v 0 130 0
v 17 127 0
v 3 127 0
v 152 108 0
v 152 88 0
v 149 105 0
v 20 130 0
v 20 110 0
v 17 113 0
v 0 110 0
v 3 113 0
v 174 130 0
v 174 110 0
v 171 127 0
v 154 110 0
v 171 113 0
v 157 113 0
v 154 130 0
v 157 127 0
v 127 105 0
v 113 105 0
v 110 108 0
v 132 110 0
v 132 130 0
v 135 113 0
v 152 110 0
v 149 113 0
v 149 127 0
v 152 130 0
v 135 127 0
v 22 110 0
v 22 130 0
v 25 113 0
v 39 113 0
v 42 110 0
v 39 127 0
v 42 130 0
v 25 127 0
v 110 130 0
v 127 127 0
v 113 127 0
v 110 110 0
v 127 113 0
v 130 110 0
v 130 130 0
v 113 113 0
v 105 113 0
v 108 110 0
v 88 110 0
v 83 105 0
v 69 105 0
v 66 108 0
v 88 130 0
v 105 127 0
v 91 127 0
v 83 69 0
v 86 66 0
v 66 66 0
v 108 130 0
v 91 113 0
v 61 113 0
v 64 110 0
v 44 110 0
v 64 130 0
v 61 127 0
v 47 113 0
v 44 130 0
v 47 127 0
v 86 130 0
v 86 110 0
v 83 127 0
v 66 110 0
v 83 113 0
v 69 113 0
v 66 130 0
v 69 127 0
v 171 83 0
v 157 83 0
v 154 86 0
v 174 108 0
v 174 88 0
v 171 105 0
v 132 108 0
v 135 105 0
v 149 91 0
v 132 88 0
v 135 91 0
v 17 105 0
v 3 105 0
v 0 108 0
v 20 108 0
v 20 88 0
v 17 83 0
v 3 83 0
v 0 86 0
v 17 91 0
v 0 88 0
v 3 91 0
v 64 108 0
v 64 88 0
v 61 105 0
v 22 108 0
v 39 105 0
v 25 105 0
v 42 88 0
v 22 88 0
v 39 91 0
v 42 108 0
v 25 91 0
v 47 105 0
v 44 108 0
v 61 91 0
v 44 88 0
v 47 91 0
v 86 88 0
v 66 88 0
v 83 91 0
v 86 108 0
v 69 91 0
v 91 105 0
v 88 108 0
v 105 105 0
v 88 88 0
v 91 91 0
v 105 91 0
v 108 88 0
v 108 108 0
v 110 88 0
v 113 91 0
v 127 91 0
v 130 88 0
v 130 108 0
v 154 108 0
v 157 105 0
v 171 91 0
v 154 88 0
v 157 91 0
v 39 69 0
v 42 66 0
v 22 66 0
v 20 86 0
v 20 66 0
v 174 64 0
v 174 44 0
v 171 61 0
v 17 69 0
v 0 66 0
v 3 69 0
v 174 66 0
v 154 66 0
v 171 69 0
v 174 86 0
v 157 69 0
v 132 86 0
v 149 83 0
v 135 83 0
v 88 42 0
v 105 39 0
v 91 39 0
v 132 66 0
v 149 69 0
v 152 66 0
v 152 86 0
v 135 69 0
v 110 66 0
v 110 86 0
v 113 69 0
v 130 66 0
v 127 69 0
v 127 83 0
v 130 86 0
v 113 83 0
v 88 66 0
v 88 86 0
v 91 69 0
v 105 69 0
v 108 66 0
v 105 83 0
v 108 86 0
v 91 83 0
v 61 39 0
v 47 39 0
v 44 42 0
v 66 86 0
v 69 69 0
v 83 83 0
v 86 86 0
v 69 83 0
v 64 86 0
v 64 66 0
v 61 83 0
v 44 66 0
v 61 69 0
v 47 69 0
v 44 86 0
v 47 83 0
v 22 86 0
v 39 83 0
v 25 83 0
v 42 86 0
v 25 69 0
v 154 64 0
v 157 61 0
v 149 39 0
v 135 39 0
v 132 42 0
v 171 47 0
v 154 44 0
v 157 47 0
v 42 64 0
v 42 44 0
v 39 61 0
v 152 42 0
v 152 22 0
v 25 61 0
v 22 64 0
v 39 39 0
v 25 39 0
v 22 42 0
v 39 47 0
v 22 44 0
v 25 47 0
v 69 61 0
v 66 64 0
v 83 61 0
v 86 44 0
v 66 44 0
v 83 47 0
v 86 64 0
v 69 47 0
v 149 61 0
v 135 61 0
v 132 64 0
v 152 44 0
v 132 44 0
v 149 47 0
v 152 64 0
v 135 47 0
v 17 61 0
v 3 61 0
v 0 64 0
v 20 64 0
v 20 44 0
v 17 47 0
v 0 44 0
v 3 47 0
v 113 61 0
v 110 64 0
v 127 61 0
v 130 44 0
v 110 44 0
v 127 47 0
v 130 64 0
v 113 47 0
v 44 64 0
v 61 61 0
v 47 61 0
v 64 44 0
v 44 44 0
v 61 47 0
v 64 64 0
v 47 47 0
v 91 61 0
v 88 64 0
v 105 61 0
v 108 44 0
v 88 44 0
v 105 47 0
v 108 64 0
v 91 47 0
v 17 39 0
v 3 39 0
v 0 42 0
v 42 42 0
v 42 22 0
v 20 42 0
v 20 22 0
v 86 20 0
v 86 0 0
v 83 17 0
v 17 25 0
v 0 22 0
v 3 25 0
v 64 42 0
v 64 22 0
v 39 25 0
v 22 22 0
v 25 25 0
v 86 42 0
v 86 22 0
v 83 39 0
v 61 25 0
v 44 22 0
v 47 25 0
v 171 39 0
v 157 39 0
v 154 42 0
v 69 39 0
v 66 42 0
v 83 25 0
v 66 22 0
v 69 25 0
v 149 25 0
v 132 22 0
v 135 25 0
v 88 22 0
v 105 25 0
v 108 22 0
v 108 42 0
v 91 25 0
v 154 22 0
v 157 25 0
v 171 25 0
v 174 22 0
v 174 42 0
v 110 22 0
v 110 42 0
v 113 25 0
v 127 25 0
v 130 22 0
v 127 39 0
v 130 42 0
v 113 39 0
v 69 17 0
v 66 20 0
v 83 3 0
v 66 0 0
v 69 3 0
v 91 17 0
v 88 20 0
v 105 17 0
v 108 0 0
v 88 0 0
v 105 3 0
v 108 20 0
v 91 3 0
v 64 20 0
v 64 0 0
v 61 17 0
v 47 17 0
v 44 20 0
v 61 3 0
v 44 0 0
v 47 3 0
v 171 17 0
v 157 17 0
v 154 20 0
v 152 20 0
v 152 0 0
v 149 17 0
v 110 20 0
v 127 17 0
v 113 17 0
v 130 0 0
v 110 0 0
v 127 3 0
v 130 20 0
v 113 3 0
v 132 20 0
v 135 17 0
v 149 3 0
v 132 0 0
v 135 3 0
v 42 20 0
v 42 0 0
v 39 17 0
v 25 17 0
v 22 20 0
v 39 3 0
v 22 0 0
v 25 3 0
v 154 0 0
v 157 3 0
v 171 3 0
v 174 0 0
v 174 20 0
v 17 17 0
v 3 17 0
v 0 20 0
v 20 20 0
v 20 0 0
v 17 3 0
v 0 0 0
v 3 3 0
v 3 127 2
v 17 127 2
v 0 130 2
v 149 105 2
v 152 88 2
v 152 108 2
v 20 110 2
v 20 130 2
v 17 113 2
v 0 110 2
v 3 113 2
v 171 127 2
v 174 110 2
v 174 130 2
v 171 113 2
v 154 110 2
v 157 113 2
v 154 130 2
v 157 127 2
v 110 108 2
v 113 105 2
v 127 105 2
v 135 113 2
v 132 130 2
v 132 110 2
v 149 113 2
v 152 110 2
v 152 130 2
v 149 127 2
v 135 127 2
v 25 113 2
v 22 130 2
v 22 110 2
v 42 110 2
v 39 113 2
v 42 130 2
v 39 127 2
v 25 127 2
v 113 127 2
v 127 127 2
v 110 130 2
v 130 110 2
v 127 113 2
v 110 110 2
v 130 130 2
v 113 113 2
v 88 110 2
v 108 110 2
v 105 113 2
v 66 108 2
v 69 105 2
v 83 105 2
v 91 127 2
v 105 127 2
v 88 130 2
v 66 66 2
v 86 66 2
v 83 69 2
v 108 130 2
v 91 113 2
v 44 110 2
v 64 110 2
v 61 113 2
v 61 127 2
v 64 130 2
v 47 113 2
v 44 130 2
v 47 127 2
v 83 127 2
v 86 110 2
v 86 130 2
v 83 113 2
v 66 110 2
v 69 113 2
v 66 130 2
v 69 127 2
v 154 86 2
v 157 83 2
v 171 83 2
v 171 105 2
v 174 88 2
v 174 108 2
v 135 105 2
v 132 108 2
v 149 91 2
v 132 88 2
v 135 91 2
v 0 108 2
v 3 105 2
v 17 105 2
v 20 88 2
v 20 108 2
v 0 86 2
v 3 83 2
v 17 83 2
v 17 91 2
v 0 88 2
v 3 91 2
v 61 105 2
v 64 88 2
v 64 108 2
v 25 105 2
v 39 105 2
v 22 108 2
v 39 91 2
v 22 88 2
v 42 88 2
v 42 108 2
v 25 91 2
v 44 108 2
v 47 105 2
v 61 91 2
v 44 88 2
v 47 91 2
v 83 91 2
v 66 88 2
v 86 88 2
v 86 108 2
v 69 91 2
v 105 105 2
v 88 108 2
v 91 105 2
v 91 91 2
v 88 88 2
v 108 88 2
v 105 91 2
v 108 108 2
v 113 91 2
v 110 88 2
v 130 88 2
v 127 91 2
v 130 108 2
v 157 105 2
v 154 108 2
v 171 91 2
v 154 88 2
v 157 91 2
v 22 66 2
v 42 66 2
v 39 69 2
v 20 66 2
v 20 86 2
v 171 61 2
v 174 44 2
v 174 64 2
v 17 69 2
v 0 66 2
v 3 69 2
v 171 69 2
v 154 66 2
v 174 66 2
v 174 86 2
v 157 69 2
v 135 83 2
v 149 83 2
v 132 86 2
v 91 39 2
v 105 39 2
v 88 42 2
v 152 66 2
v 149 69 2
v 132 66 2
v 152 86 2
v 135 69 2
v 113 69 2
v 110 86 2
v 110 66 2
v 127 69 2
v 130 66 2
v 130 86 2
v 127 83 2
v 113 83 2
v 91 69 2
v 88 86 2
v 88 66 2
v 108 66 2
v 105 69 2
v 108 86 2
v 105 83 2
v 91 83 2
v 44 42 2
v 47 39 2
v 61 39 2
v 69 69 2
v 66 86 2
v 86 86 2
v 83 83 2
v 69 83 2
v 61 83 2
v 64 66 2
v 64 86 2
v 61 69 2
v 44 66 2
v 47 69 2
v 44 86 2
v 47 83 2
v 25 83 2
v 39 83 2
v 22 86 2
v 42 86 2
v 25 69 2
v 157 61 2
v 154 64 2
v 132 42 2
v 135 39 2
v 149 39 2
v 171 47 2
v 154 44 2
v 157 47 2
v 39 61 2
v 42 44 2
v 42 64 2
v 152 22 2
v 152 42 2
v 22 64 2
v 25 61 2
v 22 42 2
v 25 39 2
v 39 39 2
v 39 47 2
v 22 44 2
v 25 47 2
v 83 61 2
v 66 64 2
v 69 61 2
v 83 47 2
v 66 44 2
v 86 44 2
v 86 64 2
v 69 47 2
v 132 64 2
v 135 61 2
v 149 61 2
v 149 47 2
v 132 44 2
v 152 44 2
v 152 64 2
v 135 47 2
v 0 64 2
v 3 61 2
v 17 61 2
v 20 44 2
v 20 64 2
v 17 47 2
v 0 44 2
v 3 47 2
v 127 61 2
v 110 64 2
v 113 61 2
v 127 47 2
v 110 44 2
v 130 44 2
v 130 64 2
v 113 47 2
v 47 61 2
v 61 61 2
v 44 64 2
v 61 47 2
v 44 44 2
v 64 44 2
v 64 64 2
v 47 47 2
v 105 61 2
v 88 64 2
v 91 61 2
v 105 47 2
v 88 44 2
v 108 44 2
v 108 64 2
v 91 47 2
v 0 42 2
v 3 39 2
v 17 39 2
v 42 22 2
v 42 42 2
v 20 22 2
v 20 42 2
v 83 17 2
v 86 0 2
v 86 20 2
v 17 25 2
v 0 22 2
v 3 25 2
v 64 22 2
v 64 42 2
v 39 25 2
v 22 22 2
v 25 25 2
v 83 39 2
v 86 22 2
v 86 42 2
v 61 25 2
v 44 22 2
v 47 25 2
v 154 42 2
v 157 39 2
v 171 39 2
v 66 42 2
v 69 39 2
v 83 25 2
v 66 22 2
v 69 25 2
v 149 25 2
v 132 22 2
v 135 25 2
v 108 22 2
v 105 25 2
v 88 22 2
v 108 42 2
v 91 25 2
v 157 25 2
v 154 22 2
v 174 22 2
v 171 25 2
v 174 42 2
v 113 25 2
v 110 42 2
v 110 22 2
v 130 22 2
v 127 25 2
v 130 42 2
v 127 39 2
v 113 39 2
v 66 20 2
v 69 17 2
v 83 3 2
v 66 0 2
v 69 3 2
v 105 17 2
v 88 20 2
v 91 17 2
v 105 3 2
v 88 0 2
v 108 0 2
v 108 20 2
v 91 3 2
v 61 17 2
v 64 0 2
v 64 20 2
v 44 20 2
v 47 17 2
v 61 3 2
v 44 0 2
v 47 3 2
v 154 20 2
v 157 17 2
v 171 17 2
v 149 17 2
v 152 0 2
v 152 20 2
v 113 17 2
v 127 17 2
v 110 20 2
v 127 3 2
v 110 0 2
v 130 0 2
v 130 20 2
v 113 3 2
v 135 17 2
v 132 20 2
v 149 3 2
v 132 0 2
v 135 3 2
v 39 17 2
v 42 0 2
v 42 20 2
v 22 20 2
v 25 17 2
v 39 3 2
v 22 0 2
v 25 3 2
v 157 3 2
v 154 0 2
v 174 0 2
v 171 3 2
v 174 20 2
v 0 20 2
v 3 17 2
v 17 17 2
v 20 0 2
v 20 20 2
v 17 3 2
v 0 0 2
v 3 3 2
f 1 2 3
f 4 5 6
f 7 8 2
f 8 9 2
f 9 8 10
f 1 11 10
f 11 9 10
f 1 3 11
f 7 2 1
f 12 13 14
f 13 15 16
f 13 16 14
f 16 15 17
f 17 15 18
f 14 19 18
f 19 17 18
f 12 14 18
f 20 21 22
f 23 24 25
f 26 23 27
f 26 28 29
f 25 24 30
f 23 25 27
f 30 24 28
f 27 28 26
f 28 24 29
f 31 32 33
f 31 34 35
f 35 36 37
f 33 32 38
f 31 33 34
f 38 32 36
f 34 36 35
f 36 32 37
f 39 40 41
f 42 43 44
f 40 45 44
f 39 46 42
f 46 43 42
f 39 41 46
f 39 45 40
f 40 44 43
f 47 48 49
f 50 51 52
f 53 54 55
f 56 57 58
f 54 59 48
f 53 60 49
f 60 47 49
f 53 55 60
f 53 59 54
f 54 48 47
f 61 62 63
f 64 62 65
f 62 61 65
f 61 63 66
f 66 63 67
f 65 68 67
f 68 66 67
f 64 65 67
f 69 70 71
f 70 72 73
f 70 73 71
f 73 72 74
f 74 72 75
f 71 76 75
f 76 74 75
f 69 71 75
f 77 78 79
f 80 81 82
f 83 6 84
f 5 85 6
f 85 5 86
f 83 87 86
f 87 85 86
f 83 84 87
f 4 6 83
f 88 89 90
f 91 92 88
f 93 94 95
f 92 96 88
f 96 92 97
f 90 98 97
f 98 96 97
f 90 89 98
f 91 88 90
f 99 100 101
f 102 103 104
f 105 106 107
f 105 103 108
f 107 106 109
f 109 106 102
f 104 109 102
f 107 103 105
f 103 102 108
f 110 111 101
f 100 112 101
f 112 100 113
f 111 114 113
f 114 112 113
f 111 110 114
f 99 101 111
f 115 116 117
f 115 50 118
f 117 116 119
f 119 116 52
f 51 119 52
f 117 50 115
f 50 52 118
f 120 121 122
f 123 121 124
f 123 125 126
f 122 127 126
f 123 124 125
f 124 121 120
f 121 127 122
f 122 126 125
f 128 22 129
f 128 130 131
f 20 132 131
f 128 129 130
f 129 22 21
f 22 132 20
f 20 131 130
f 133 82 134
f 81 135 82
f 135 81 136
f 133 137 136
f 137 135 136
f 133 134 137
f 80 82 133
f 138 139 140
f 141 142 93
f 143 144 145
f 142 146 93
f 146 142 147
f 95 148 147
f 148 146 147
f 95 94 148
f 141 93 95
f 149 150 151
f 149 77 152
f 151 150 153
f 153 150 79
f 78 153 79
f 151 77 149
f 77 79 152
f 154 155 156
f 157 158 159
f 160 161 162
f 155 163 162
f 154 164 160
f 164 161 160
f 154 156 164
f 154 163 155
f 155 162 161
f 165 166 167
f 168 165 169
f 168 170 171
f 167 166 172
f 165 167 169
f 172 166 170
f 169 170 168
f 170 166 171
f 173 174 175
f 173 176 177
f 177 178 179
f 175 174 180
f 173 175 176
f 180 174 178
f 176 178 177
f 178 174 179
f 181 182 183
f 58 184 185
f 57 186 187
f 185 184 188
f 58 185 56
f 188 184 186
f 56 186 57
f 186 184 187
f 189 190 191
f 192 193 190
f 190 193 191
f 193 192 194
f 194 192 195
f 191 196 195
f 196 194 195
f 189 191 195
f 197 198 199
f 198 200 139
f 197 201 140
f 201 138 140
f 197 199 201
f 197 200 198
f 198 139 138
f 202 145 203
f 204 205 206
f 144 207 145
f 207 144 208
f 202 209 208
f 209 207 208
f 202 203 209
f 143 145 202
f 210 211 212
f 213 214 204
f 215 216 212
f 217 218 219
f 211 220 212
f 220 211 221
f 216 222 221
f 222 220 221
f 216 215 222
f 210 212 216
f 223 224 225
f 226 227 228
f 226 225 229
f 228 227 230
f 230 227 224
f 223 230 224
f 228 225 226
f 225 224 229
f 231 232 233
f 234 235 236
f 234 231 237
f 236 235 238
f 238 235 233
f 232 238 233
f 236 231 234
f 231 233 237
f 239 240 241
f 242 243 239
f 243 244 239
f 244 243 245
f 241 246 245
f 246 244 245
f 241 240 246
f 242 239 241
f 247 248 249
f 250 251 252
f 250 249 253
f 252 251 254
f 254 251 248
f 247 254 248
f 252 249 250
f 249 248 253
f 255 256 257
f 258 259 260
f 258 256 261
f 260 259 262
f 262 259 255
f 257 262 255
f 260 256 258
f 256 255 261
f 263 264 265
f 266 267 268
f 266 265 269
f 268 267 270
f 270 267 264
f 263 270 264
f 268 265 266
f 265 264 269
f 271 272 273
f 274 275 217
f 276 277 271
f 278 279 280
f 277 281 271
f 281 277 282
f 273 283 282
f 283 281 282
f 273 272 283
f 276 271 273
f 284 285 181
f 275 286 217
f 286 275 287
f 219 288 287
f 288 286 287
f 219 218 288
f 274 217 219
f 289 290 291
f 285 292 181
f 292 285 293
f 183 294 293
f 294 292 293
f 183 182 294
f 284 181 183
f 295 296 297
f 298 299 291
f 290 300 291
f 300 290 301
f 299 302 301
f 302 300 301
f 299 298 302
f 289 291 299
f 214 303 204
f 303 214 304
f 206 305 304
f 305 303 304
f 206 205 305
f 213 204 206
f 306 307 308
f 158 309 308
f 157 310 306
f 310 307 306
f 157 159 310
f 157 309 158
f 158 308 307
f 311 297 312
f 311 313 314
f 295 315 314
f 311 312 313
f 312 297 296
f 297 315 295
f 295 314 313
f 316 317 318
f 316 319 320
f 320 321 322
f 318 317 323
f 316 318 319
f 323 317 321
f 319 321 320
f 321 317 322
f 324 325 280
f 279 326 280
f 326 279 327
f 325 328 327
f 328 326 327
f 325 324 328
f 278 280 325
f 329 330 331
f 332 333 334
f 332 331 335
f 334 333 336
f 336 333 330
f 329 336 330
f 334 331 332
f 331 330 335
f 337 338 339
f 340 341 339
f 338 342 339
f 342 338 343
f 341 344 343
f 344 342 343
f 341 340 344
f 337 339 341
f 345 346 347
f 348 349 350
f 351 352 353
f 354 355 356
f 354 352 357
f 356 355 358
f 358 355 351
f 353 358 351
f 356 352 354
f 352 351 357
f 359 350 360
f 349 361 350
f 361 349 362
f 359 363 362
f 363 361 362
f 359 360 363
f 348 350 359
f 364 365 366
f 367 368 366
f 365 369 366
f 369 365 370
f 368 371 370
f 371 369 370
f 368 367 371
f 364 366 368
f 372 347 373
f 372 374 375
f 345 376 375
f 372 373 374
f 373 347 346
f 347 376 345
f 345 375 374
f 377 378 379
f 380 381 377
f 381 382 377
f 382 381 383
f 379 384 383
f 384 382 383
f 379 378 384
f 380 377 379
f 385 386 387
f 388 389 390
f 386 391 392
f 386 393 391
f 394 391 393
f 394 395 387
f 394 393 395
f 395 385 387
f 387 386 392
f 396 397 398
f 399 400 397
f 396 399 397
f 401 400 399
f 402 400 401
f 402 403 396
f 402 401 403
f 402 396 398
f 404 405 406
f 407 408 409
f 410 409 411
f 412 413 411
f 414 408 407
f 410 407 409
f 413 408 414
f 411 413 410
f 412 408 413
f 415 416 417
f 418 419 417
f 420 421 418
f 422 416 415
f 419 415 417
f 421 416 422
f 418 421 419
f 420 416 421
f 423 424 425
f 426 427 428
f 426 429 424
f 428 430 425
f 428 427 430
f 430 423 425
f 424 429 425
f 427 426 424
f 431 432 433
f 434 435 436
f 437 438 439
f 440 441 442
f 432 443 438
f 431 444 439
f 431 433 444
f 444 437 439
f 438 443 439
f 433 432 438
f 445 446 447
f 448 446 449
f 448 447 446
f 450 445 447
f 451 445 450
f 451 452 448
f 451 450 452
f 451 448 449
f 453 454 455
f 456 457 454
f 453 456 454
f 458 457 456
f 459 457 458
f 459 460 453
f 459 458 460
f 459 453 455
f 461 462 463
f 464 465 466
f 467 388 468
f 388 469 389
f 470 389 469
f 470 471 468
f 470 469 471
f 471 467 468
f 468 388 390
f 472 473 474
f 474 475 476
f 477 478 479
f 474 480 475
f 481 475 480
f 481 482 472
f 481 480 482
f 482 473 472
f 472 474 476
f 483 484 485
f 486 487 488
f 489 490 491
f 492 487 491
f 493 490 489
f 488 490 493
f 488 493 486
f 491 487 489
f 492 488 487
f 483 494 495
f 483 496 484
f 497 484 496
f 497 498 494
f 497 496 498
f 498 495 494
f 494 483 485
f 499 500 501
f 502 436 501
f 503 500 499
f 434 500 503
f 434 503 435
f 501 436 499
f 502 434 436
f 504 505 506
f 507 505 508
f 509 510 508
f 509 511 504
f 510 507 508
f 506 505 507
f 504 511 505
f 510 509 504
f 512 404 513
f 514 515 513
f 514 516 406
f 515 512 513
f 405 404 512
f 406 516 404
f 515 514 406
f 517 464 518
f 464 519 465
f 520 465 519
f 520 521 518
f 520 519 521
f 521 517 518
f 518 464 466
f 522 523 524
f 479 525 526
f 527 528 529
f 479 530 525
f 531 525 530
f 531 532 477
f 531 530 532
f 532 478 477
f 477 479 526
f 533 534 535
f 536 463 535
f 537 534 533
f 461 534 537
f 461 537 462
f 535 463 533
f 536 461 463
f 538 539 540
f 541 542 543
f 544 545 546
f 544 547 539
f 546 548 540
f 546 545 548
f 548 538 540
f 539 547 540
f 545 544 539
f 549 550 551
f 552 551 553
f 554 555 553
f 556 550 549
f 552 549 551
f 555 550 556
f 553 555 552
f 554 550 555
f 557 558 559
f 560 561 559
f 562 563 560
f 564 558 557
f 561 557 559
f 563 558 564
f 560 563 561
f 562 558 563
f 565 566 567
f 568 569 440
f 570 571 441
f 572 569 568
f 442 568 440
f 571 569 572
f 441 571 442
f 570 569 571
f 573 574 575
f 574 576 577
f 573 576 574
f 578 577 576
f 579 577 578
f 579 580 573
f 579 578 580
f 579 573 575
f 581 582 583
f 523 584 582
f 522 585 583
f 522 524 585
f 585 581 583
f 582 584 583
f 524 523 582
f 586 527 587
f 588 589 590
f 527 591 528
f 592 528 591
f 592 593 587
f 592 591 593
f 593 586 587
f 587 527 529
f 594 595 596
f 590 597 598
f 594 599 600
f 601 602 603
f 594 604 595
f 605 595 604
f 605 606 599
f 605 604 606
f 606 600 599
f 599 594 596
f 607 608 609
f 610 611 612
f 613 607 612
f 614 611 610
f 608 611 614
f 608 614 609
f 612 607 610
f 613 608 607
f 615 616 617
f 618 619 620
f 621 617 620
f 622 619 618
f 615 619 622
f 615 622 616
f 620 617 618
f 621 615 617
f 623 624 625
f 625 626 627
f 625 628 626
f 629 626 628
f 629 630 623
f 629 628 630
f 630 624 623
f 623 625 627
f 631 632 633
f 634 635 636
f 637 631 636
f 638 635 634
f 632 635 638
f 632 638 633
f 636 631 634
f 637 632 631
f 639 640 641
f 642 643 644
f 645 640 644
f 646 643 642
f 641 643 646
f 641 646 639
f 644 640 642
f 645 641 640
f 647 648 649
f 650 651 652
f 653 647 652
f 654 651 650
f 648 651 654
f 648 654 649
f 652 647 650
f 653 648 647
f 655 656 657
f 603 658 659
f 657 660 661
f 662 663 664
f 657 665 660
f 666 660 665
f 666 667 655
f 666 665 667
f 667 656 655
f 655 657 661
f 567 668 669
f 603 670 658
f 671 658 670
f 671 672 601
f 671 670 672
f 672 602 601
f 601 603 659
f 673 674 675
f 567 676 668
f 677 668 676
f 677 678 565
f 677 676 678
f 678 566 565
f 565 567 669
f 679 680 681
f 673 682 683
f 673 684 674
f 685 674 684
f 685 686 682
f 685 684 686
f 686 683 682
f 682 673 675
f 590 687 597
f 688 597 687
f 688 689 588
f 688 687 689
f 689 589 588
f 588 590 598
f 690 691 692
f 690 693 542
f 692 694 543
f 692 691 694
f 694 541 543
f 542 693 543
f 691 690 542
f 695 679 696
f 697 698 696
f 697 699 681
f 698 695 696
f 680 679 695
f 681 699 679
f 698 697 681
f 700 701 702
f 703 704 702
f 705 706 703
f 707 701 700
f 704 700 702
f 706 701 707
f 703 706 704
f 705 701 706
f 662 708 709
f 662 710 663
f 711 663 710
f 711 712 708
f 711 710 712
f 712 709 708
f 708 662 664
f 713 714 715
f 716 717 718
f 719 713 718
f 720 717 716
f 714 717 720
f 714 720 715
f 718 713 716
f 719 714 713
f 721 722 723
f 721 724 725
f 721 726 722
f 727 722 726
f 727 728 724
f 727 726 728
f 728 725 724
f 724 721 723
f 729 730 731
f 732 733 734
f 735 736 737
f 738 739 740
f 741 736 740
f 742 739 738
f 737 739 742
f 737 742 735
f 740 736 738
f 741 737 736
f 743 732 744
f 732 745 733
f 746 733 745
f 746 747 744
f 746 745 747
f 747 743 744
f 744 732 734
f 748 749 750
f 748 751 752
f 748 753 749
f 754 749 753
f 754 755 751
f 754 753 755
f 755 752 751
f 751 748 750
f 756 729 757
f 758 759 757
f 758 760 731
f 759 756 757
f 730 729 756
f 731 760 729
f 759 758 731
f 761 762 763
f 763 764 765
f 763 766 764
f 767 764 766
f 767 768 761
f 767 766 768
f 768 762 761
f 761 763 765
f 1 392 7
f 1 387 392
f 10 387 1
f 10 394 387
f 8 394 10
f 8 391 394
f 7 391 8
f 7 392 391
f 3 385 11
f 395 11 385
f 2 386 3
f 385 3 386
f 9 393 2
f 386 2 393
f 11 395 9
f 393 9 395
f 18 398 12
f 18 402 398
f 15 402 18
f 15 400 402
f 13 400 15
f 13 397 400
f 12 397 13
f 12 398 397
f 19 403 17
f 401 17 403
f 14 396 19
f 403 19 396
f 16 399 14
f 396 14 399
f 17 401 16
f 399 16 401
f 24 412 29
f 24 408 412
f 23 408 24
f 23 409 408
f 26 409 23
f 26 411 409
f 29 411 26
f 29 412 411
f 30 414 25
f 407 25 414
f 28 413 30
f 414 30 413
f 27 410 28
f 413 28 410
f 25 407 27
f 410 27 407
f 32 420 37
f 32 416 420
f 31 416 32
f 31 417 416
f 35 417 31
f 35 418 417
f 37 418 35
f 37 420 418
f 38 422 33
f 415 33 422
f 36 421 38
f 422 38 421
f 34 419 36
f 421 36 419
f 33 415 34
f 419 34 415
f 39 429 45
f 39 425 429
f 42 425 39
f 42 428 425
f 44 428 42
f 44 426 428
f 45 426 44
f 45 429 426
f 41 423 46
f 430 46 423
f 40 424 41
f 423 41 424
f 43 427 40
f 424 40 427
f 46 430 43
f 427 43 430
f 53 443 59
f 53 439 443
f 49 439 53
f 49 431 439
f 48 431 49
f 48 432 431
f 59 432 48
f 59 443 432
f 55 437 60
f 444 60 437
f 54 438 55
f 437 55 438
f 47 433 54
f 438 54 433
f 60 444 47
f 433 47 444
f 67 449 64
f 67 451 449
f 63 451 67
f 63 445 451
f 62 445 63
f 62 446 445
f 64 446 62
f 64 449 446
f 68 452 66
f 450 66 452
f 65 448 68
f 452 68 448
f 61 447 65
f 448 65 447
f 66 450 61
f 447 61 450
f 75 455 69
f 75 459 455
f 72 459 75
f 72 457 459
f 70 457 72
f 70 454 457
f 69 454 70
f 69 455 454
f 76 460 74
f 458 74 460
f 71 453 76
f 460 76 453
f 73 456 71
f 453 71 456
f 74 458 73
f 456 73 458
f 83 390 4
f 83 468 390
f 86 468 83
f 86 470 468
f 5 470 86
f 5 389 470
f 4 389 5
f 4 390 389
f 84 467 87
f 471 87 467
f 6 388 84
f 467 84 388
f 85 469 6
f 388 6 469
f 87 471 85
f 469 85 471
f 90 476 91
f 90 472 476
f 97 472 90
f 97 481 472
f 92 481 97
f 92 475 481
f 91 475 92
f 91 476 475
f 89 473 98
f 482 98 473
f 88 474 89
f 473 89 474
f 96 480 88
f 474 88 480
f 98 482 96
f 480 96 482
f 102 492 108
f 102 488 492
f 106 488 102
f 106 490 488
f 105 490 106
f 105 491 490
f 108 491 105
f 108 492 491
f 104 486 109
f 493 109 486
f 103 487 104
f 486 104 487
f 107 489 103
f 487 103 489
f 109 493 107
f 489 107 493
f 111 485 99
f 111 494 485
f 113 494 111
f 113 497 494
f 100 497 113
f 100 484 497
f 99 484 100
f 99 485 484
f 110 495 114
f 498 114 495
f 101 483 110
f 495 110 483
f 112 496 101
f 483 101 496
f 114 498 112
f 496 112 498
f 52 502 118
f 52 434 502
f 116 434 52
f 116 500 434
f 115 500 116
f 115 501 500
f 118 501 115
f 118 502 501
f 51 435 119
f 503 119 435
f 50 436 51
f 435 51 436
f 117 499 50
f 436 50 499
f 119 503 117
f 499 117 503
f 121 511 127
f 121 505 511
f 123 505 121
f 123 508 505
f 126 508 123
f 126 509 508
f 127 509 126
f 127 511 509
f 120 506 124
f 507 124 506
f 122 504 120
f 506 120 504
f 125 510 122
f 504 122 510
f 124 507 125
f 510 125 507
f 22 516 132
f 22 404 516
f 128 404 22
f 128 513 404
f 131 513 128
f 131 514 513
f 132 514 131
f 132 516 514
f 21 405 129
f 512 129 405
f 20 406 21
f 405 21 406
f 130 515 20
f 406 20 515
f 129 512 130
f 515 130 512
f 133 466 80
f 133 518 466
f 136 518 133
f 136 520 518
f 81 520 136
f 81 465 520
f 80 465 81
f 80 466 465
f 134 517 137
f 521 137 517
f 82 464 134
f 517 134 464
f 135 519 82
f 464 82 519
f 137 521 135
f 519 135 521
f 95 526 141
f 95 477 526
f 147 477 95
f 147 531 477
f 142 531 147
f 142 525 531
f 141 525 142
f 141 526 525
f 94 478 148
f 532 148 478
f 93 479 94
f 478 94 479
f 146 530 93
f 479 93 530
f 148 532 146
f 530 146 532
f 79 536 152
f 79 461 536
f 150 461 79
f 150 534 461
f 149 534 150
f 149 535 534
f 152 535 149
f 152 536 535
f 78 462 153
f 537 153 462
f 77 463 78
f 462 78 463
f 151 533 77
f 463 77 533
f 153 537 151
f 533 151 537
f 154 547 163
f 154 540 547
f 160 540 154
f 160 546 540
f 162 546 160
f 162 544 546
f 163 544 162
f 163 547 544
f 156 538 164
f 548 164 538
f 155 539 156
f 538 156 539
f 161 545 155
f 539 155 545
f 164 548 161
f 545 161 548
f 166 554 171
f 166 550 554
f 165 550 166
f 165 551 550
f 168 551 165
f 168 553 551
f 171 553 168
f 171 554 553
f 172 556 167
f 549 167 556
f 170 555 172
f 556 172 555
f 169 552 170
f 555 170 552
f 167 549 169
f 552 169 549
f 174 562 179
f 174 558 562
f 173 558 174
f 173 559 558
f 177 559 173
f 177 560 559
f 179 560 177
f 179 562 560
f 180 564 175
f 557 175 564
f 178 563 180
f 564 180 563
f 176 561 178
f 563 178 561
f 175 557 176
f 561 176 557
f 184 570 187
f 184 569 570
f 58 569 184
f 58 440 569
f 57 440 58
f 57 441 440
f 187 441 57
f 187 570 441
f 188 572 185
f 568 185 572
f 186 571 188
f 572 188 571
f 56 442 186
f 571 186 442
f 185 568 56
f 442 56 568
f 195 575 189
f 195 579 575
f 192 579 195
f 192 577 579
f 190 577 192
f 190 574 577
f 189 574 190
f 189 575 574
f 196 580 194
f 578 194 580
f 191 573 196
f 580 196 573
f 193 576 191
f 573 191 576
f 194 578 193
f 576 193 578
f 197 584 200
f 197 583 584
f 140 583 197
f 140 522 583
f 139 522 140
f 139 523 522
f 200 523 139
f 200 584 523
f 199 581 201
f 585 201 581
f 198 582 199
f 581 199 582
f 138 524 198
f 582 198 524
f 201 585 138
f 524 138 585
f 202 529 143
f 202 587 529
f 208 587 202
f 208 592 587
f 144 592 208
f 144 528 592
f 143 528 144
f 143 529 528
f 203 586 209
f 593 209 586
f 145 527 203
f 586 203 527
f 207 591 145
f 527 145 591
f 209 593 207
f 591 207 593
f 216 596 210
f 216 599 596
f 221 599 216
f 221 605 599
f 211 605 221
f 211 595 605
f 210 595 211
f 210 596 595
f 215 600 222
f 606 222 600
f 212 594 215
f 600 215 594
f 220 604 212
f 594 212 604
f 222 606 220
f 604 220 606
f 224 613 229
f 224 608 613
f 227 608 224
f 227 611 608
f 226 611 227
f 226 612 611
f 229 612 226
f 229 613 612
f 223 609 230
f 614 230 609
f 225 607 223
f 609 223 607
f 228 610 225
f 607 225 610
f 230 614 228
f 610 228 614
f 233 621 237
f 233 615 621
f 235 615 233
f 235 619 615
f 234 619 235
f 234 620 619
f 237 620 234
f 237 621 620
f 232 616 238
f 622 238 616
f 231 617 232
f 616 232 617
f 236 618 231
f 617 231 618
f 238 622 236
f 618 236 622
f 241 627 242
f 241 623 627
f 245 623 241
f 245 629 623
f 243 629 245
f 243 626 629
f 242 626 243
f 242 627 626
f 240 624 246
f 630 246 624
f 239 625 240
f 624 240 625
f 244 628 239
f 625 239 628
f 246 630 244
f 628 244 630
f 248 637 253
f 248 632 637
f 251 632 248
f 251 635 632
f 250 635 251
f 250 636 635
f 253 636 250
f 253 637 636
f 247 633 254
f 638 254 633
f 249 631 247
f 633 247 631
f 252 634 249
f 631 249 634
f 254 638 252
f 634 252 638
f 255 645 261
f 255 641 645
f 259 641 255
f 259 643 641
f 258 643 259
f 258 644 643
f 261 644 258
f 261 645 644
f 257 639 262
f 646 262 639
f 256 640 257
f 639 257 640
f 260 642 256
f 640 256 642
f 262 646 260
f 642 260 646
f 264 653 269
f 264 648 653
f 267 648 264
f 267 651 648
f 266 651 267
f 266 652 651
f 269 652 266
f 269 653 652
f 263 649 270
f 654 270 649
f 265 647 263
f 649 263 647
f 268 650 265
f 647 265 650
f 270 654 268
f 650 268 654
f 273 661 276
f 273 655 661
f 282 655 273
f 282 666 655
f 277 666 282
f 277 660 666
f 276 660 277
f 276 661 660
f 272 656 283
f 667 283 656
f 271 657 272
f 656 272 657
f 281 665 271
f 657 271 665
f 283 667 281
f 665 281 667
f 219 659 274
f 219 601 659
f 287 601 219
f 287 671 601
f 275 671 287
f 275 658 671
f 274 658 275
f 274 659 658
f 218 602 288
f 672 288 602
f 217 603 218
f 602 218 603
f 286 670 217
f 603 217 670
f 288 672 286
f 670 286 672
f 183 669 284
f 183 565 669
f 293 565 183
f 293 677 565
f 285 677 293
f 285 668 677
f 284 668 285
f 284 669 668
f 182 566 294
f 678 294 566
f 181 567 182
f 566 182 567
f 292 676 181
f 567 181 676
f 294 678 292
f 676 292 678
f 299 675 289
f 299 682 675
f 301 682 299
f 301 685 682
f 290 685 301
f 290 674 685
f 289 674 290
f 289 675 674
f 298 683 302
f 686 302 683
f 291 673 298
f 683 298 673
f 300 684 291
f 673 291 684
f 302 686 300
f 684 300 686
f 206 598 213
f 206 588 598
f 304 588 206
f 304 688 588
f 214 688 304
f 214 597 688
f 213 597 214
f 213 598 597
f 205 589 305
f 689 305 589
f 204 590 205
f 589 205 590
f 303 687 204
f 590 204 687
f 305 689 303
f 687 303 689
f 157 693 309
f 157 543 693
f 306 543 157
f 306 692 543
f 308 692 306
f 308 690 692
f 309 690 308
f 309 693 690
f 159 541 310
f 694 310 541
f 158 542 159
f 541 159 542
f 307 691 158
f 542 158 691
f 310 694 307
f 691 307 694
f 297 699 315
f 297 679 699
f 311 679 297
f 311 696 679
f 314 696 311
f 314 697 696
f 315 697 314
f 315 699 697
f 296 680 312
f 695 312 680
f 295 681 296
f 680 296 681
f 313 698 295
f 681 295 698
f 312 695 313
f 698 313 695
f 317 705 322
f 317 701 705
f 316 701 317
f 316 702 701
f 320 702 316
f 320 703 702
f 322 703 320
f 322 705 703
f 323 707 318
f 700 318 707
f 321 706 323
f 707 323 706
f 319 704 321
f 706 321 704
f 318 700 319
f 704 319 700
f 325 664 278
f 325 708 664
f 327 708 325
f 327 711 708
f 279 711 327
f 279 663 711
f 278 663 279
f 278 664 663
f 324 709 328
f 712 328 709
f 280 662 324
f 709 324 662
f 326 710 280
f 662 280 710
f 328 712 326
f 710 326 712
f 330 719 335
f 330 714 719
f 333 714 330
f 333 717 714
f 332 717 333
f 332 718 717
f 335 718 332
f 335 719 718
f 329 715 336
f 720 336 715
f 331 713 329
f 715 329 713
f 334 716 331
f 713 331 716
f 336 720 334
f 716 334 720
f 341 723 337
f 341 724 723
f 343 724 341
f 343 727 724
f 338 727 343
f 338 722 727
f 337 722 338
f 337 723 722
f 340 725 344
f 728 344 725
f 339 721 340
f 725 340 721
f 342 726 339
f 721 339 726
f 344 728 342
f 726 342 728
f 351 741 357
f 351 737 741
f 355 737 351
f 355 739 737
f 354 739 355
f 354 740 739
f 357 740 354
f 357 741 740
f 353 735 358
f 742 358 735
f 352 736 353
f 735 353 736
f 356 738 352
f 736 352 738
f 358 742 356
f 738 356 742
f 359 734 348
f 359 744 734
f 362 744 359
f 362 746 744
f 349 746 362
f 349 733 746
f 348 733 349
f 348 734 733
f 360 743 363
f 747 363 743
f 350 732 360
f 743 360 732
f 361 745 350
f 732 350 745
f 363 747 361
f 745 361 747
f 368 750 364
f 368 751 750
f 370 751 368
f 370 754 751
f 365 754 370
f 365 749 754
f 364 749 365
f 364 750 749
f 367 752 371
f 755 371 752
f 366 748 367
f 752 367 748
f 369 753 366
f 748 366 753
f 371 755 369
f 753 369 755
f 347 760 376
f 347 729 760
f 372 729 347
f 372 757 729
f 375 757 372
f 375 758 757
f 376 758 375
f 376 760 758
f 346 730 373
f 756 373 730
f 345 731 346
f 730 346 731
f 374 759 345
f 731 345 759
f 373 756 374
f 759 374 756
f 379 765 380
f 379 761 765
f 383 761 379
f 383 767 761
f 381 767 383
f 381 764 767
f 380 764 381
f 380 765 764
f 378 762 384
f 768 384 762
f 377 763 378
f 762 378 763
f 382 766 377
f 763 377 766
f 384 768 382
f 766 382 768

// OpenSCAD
/*
  Tiling panel: repeated motif with adjustable spacing and wall thickness.
*/
tile_w = 20;
tile_h = 20;
cols = 8;
rows = 6;
gap = 2;
th = 2;

module motif(){
    difference(){
        square([tile_w, tile_h], center=false);
        offset(r= -3) square([tile_w, tile_h], center=false);
        translate([tile_w/2, tile_h/2]) circle(r=4, $fn=48);
    }
}

linear_extrude(height=th)
for (y=[0:rows-1])
 for (x=[0:cols-1])
  translate([x*(tile_w+gap), y*(tile_h+gap)]) motif();
